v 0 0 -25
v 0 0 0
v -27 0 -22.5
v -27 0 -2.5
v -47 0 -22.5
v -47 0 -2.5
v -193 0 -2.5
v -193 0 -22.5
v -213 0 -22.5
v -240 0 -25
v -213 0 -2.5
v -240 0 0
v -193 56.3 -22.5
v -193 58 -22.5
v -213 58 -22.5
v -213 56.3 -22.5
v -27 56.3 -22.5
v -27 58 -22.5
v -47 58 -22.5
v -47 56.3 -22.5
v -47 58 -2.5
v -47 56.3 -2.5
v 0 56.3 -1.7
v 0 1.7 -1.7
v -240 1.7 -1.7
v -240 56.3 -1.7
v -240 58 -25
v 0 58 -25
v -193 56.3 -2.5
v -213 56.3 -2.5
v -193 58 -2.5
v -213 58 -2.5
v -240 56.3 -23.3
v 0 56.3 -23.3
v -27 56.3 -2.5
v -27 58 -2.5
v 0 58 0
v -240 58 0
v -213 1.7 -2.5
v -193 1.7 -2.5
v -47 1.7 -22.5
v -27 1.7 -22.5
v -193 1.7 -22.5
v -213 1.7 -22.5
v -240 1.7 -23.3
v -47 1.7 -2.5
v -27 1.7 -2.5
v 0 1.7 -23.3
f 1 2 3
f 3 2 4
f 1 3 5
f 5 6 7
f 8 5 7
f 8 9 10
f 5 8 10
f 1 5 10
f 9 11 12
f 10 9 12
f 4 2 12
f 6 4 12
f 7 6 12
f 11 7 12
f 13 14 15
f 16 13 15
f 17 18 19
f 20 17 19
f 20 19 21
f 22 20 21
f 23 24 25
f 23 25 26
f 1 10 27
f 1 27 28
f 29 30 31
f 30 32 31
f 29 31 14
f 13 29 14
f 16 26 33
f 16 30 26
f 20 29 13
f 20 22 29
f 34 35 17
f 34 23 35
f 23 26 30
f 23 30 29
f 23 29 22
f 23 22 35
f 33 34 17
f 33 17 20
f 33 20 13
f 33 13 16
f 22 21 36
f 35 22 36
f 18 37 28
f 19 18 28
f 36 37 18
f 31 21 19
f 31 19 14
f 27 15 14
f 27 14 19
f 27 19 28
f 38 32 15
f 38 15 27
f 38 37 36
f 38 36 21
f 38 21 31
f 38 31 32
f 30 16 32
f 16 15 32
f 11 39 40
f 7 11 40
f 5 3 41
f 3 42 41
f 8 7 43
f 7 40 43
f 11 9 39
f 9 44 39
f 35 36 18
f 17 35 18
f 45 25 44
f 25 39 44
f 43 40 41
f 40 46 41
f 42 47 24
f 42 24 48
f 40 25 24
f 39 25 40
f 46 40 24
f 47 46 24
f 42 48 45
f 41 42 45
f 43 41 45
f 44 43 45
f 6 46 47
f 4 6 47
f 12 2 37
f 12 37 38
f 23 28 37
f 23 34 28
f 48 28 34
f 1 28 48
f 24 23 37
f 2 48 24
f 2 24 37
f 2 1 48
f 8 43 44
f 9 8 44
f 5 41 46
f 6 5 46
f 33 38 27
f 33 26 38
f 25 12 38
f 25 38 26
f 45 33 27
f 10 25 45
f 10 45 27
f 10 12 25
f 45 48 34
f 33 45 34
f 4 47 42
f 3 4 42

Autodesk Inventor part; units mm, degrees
ref_plane "YZ Plane" through (0, 0, 0) normal (1, 0, 0) x (0, 1, 0)
ref_plane "XZ Plane" through (0, 0, 0) normal (0, 1, 0) x (-1, 0, 0)
ref_plane "XY Plane" through (0, 0, 0) normal (0, 0, 1) x (1, 0, 0)
sketch "Boceto1" plane through (0, 0, 0) normal (0, 1, 0) x (-1, 0, 0)
  line L0 (0, 0) -> (240, 0)
  line L1 (240, 0) -> (240, -25)
  line L2 (240, -25) -> (0, -25)
  line L3 (0, -25) -> (0, 0)
  dimension "d0" = 240
  dimension "d1" = 25
extrude "Extrusión1" add sketch "Boceto1" along normal blind 58
sketch "Boceto2" plane through (0, 58, 0) normal (0, 1, 0) x (1, 0, 0)
  line L0 (0, 25) -> (-240, 25) projected
  line L1 (-240, 25) -> (-240, 0) projected
  line L2 (-240, 0) -> (0, 0) projected
  line L3 (0, 0) -> (0, 25) projected
  line L4 (-213, 2.5) -> (-193, 2.5)
  line L5 (-193, 2.5) -> (-193, 22.5)
  line L6 (-193, 22.5) -> (-213, 22.5)
  line L7 (-213, 22.5) -> (-213, 2.5)
  line L8 (-213, 2.5) -> (-193, 22.5) construction
  line L9 (-193, 2.5) -> (-213, 22.5) construction
  line L10 (-27, 22.5) -> (-47, 22.5)
  line L11 (-47, 22.5) -> (-47, 2.5)
  line L12 (-47, 2.5) -> (-27, 2.5)
  line L13 (-27, 2.5) -> (-27, 22.5)
  line L14 (-27, 22.5) -> (-47, 2.5) construction
  line L15 (-47, 22.5) -> (-27, 2.5) construction
  point P0 (-203, 12.5)
  point P1 (-37, 12.5)
  dimension "d10" = 20
  dimension "d11" = 20
  dimension "d12" = 20
  dimension "d13" = 20
  dimension "d14" = 27
  dimension "d15" = 146
extrude "Extrusión2" cut sketch "Boceto2" against normal blind 58 contours L7 L6 L5 L4 | L13 L12 L11 L10
sketch "Boceto3" plane through (0, 0, 0) normal (1, 0, 0) x (0, 0, -1)
  line L0 (0, 0) -> (25, 0) projected
  line L1 (25, 0) -> (25, 58) projected
  line L2 (0, 58) -> (25, 58) projected
  line L3 (0, 0) -> (0, 58) projected
  line L4 (0, 0) -> (0, 58) projected
  line L5 (1.7, 52.5054) -> (1.7, 56.3)
  line L6 (1.7, 56.3) -> (23.3, 56.3)
  line L7 (25, 0) -> (25, 58) projected
  line L8 (22.5, 0) -> (2.5, 0) projected
  line L9 (7.4249, 0) -> (7.4249, 1.7)
  line L10 (7.4249, 1.7) -> (1.7, 1.7)
  line L11 (1.7, 52.5054) -> (1.7, 1.7)
  line L12 (7.4249, 1.7) -> (23.3, 1.7)
  line L13 (23.3, 1.7) -> (23.3, 56.3)
  point P0 (12.9, 29.7431)
  point P1 (2.5, 58)
extrude "Extrusión3" cut sketch "Boceto3" against normal blind 240 contours L10 L11 L5 L6 L13 L12
properties part number "Travesaño"
